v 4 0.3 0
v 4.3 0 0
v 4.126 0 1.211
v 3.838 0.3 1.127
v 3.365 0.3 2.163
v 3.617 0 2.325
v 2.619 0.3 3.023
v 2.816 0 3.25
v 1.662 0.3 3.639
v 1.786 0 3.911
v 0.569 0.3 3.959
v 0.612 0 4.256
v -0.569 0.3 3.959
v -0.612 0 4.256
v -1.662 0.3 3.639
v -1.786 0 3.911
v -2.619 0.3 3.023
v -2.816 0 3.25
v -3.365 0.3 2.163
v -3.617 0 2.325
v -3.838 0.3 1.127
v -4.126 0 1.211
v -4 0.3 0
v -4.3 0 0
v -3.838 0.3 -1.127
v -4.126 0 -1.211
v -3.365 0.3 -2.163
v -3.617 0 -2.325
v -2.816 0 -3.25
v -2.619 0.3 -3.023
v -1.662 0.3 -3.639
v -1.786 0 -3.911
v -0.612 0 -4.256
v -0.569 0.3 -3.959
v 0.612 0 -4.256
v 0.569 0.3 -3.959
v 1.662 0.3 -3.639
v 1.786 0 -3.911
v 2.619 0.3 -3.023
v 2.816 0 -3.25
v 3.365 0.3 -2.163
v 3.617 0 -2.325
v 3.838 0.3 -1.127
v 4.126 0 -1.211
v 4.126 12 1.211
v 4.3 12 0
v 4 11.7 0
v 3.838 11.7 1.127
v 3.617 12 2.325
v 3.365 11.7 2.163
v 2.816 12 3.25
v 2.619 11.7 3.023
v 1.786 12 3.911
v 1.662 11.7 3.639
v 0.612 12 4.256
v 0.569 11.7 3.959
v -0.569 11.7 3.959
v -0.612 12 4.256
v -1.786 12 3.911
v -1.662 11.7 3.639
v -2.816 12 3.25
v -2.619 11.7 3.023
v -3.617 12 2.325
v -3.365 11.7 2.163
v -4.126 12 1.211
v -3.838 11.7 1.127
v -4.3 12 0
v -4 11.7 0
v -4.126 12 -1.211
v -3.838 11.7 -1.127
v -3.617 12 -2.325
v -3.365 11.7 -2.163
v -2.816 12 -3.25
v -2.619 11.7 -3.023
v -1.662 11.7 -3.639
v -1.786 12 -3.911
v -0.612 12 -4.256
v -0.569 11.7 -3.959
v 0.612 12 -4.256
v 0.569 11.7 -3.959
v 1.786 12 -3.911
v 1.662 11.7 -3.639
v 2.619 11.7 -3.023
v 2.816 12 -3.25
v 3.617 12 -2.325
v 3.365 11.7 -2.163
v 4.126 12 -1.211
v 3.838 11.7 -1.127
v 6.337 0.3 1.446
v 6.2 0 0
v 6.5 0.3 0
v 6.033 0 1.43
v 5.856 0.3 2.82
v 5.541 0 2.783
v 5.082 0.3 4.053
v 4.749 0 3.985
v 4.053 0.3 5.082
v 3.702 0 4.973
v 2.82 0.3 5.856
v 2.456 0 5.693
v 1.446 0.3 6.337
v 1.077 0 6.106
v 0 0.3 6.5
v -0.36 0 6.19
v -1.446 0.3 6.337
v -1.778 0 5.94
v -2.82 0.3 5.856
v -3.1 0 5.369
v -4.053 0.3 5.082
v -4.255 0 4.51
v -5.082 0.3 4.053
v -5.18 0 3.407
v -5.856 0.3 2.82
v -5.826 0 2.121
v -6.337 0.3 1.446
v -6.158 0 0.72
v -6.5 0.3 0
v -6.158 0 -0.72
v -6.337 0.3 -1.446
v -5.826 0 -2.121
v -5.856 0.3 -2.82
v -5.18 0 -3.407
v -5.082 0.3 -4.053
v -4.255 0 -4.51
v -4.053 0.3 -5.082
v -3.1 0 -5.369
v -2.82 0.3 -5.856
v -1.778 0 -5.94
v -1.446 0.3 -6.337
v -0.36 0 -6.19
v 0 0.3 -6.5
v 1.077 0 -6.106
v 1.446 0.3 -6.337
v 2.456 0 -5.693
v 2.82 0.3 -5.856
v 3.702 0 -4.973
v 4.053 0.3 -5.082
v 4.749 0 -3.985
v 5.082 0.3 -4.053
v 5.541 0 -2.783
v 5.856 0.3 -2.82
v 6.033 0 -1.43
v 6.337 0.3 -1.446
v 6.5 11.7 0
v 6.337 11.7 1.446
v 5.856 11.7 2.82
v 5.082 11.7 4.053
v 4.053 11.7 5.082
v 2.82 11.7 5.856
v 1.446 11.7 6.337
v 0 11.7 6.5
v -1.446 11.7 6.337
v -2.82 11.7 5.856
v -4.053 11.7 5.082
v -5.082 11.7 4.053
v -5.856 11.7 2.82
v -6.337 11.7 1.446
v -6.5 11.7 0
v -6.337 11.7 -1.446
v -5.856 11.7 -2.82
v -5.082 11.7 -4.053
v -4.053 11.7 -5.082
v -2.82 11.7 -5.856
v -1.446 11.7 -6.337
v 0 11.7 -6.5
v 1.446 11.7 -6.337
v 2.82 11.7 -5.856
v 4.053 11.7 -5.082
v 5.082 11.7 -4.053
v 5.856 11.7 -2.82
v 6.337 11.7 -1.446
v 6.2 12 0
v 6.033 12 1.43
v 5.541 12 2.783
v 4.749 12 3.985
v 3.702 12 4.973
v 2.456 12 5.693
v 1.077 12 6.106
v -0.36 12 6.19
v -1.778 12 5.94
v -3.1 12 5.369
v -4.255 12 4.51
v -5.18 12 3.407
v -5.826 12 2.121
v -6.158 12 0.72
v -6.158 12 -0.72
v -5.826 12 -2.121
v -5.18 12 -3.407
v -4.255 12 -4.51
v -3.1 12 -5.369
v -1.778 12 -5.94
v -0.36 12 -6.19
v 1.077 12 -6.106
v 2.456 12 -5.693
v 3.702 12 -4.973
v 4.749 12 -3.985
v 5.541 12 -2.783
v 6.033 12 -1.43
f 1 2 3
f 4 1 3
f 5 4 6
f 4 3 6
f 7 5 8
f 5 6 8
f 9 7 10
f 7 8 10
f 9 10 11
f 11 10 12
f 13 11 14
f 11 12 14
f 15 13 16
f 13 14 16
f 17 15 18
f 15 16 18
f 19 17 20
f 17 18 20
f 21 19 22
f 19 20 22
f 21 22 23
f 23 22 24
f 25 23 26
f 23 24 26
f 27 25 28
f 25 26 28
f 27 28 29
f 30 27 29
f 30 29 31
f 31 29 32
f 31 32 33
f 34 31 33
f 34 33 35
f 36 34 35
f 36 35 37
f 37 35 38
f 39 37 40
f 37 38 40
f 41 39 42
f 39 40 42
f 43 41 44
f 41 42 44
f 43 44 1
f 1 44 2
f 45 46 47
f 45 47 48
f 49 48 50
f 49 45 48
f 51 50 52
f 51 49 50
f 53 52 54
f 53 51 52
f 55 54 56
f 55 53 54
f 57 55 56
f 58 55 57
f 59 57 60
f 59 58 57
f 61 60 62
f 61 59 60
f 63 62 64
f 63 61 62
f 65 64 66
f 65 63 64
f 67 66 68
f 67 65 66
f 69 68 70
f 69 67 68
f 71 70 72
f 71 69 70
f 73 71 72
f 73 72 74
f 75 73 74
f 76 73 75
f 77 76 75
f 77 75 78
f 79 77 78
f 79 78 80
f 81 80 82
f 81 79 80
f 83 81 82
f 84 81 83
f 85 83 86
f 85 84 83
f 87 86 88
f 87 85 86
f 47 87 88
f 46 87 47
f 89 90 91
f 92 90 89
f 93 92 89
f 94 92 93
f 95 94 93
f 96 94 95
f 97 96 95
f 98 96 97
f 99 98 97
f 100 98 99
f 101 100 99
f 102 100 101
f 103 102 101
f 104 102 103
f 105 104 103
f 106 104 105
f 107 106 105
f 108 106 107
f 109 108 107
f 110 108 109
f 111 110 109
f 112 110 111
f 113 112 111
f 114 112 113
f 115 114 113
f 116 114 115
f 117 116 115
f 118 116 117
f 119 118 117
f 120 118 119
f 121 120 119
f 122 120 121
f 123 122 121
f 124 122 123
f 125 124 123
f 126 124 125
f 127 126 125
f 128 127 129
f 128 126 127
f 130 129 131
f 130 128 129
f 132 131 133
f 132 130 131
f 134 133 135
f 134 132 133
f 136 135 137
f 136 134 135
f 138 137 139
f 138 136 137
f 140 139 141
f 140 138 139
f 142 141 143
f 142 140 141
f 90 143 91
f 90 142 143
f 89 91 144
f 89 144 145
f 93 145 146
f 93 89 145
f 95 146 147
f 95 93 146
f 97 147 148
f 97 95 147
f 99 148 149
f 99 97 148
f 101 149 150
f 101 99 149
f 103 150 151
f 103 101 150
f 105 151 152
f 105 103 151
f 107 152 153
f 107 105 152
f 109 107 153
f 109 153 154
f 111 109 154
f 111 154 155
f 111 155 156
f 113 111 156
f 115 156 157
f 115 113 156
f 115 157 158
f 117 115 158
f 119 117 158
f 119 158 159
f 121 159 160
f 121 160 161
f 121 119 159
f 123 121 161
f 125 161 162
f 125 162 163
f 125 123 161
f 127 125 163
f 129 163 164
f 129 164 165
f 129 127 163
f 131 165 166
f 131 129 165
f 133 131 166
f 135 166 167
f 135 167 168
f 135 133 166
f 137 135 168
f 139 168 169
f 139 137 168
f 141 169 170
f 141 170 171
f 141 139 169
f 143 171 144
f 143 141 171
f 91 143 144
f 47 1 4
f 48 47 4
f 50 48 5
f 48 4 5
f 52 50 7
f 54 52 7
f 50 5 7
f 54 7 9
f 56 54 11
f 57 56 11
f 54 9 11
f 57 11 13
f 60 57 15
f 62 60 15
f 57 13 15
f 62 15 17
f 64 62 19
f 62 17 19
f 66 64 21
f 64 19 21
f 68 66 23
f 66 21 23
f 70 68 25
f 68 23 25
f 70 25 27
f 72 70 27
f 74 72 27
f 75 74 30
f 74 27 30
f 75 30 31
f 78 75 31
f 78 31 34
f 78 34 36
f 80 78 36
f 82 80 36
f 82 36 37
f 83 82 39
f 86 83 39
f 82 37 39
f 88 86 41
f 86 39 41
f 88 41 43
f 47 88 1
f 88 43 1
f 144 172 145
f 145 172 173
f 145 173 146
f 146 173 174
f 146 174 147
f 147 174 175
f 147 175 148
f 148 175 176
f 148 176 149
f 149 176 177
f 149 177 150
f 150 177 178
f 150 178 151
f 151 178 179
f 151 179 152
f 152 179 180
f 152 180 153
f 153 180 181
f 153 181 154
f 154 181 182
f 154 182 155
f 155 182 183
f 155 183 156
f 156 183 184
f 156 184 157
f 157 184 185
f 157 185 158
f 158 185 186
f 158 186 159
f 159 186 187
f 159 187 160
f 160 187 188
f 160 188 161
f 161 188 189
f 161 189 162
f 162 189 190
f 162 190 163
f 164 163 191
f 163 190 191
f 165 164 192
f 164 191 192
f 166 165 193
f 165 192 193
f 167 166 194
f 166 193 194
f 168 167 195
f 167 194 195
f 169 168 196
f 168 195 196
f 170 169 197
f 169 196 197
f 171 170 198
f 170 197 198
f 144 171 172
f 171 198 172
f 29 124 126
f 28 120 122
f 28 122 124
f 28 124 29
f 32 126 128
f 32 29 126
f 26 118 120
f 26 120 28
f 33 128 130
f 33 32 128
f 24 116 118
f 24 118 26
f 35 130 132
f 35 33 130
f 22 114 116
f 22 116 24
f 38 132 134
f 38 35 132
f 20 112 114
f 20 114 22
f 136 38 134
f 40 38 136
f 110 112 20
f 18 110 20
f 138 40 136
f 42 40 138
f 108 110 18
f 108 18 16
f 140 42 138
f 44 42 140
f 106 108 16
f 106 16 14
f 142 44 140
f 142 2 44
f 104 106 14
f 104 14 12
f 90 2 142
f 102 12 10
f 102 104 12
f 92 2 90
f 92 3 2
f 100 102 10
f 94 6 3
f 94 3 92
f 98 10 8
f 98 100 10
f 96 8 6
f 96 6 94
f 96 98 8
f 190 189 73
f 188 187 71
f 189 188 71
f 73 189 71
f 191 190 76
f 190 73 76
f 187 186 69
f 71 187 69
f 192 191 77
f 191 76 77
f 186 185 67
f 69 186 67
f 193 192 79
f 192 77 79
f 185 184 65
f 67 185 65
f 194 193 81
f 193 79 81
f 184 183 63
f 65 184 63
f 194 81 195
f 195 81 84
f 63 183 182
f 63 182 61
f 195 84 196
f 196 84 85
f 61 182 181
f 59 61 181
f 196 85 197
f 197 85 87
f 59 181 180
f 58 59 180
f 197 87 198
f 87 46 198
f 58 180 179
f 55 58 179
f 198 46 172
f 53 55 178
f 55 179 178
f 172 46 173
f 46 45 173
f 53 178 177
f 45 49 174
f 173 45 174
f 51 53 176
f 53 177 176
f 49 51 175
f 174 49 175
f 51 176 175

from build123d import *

# Parameters (mm, degrees)
F0_R     = 6.5
F0_R_2   = 4
F1_DEPTH = 12
F2_SIZE  = 0.3


with BuildPart() as f1:
    # F0 (on Front) → F1 (new body)
    with BuildSketch(Plane.XZ):
        Circle(F0_R)
        Circle(F0_R_2, mode=Mode.SUBTRACT)
    extrude(amount=-F1_DEPTH)

    # F2
    f2_edges = [f1.edges().sort_by_distance(p)[0] for p in [
        (-6.5, 0, 0),
        (-6.5, 12, 0),
        (-4, 0, 0),
        (-4, 12, 0),
    ]]
    chamfer(f2_edges, length=F2_SIZE)


solid = f1.part
